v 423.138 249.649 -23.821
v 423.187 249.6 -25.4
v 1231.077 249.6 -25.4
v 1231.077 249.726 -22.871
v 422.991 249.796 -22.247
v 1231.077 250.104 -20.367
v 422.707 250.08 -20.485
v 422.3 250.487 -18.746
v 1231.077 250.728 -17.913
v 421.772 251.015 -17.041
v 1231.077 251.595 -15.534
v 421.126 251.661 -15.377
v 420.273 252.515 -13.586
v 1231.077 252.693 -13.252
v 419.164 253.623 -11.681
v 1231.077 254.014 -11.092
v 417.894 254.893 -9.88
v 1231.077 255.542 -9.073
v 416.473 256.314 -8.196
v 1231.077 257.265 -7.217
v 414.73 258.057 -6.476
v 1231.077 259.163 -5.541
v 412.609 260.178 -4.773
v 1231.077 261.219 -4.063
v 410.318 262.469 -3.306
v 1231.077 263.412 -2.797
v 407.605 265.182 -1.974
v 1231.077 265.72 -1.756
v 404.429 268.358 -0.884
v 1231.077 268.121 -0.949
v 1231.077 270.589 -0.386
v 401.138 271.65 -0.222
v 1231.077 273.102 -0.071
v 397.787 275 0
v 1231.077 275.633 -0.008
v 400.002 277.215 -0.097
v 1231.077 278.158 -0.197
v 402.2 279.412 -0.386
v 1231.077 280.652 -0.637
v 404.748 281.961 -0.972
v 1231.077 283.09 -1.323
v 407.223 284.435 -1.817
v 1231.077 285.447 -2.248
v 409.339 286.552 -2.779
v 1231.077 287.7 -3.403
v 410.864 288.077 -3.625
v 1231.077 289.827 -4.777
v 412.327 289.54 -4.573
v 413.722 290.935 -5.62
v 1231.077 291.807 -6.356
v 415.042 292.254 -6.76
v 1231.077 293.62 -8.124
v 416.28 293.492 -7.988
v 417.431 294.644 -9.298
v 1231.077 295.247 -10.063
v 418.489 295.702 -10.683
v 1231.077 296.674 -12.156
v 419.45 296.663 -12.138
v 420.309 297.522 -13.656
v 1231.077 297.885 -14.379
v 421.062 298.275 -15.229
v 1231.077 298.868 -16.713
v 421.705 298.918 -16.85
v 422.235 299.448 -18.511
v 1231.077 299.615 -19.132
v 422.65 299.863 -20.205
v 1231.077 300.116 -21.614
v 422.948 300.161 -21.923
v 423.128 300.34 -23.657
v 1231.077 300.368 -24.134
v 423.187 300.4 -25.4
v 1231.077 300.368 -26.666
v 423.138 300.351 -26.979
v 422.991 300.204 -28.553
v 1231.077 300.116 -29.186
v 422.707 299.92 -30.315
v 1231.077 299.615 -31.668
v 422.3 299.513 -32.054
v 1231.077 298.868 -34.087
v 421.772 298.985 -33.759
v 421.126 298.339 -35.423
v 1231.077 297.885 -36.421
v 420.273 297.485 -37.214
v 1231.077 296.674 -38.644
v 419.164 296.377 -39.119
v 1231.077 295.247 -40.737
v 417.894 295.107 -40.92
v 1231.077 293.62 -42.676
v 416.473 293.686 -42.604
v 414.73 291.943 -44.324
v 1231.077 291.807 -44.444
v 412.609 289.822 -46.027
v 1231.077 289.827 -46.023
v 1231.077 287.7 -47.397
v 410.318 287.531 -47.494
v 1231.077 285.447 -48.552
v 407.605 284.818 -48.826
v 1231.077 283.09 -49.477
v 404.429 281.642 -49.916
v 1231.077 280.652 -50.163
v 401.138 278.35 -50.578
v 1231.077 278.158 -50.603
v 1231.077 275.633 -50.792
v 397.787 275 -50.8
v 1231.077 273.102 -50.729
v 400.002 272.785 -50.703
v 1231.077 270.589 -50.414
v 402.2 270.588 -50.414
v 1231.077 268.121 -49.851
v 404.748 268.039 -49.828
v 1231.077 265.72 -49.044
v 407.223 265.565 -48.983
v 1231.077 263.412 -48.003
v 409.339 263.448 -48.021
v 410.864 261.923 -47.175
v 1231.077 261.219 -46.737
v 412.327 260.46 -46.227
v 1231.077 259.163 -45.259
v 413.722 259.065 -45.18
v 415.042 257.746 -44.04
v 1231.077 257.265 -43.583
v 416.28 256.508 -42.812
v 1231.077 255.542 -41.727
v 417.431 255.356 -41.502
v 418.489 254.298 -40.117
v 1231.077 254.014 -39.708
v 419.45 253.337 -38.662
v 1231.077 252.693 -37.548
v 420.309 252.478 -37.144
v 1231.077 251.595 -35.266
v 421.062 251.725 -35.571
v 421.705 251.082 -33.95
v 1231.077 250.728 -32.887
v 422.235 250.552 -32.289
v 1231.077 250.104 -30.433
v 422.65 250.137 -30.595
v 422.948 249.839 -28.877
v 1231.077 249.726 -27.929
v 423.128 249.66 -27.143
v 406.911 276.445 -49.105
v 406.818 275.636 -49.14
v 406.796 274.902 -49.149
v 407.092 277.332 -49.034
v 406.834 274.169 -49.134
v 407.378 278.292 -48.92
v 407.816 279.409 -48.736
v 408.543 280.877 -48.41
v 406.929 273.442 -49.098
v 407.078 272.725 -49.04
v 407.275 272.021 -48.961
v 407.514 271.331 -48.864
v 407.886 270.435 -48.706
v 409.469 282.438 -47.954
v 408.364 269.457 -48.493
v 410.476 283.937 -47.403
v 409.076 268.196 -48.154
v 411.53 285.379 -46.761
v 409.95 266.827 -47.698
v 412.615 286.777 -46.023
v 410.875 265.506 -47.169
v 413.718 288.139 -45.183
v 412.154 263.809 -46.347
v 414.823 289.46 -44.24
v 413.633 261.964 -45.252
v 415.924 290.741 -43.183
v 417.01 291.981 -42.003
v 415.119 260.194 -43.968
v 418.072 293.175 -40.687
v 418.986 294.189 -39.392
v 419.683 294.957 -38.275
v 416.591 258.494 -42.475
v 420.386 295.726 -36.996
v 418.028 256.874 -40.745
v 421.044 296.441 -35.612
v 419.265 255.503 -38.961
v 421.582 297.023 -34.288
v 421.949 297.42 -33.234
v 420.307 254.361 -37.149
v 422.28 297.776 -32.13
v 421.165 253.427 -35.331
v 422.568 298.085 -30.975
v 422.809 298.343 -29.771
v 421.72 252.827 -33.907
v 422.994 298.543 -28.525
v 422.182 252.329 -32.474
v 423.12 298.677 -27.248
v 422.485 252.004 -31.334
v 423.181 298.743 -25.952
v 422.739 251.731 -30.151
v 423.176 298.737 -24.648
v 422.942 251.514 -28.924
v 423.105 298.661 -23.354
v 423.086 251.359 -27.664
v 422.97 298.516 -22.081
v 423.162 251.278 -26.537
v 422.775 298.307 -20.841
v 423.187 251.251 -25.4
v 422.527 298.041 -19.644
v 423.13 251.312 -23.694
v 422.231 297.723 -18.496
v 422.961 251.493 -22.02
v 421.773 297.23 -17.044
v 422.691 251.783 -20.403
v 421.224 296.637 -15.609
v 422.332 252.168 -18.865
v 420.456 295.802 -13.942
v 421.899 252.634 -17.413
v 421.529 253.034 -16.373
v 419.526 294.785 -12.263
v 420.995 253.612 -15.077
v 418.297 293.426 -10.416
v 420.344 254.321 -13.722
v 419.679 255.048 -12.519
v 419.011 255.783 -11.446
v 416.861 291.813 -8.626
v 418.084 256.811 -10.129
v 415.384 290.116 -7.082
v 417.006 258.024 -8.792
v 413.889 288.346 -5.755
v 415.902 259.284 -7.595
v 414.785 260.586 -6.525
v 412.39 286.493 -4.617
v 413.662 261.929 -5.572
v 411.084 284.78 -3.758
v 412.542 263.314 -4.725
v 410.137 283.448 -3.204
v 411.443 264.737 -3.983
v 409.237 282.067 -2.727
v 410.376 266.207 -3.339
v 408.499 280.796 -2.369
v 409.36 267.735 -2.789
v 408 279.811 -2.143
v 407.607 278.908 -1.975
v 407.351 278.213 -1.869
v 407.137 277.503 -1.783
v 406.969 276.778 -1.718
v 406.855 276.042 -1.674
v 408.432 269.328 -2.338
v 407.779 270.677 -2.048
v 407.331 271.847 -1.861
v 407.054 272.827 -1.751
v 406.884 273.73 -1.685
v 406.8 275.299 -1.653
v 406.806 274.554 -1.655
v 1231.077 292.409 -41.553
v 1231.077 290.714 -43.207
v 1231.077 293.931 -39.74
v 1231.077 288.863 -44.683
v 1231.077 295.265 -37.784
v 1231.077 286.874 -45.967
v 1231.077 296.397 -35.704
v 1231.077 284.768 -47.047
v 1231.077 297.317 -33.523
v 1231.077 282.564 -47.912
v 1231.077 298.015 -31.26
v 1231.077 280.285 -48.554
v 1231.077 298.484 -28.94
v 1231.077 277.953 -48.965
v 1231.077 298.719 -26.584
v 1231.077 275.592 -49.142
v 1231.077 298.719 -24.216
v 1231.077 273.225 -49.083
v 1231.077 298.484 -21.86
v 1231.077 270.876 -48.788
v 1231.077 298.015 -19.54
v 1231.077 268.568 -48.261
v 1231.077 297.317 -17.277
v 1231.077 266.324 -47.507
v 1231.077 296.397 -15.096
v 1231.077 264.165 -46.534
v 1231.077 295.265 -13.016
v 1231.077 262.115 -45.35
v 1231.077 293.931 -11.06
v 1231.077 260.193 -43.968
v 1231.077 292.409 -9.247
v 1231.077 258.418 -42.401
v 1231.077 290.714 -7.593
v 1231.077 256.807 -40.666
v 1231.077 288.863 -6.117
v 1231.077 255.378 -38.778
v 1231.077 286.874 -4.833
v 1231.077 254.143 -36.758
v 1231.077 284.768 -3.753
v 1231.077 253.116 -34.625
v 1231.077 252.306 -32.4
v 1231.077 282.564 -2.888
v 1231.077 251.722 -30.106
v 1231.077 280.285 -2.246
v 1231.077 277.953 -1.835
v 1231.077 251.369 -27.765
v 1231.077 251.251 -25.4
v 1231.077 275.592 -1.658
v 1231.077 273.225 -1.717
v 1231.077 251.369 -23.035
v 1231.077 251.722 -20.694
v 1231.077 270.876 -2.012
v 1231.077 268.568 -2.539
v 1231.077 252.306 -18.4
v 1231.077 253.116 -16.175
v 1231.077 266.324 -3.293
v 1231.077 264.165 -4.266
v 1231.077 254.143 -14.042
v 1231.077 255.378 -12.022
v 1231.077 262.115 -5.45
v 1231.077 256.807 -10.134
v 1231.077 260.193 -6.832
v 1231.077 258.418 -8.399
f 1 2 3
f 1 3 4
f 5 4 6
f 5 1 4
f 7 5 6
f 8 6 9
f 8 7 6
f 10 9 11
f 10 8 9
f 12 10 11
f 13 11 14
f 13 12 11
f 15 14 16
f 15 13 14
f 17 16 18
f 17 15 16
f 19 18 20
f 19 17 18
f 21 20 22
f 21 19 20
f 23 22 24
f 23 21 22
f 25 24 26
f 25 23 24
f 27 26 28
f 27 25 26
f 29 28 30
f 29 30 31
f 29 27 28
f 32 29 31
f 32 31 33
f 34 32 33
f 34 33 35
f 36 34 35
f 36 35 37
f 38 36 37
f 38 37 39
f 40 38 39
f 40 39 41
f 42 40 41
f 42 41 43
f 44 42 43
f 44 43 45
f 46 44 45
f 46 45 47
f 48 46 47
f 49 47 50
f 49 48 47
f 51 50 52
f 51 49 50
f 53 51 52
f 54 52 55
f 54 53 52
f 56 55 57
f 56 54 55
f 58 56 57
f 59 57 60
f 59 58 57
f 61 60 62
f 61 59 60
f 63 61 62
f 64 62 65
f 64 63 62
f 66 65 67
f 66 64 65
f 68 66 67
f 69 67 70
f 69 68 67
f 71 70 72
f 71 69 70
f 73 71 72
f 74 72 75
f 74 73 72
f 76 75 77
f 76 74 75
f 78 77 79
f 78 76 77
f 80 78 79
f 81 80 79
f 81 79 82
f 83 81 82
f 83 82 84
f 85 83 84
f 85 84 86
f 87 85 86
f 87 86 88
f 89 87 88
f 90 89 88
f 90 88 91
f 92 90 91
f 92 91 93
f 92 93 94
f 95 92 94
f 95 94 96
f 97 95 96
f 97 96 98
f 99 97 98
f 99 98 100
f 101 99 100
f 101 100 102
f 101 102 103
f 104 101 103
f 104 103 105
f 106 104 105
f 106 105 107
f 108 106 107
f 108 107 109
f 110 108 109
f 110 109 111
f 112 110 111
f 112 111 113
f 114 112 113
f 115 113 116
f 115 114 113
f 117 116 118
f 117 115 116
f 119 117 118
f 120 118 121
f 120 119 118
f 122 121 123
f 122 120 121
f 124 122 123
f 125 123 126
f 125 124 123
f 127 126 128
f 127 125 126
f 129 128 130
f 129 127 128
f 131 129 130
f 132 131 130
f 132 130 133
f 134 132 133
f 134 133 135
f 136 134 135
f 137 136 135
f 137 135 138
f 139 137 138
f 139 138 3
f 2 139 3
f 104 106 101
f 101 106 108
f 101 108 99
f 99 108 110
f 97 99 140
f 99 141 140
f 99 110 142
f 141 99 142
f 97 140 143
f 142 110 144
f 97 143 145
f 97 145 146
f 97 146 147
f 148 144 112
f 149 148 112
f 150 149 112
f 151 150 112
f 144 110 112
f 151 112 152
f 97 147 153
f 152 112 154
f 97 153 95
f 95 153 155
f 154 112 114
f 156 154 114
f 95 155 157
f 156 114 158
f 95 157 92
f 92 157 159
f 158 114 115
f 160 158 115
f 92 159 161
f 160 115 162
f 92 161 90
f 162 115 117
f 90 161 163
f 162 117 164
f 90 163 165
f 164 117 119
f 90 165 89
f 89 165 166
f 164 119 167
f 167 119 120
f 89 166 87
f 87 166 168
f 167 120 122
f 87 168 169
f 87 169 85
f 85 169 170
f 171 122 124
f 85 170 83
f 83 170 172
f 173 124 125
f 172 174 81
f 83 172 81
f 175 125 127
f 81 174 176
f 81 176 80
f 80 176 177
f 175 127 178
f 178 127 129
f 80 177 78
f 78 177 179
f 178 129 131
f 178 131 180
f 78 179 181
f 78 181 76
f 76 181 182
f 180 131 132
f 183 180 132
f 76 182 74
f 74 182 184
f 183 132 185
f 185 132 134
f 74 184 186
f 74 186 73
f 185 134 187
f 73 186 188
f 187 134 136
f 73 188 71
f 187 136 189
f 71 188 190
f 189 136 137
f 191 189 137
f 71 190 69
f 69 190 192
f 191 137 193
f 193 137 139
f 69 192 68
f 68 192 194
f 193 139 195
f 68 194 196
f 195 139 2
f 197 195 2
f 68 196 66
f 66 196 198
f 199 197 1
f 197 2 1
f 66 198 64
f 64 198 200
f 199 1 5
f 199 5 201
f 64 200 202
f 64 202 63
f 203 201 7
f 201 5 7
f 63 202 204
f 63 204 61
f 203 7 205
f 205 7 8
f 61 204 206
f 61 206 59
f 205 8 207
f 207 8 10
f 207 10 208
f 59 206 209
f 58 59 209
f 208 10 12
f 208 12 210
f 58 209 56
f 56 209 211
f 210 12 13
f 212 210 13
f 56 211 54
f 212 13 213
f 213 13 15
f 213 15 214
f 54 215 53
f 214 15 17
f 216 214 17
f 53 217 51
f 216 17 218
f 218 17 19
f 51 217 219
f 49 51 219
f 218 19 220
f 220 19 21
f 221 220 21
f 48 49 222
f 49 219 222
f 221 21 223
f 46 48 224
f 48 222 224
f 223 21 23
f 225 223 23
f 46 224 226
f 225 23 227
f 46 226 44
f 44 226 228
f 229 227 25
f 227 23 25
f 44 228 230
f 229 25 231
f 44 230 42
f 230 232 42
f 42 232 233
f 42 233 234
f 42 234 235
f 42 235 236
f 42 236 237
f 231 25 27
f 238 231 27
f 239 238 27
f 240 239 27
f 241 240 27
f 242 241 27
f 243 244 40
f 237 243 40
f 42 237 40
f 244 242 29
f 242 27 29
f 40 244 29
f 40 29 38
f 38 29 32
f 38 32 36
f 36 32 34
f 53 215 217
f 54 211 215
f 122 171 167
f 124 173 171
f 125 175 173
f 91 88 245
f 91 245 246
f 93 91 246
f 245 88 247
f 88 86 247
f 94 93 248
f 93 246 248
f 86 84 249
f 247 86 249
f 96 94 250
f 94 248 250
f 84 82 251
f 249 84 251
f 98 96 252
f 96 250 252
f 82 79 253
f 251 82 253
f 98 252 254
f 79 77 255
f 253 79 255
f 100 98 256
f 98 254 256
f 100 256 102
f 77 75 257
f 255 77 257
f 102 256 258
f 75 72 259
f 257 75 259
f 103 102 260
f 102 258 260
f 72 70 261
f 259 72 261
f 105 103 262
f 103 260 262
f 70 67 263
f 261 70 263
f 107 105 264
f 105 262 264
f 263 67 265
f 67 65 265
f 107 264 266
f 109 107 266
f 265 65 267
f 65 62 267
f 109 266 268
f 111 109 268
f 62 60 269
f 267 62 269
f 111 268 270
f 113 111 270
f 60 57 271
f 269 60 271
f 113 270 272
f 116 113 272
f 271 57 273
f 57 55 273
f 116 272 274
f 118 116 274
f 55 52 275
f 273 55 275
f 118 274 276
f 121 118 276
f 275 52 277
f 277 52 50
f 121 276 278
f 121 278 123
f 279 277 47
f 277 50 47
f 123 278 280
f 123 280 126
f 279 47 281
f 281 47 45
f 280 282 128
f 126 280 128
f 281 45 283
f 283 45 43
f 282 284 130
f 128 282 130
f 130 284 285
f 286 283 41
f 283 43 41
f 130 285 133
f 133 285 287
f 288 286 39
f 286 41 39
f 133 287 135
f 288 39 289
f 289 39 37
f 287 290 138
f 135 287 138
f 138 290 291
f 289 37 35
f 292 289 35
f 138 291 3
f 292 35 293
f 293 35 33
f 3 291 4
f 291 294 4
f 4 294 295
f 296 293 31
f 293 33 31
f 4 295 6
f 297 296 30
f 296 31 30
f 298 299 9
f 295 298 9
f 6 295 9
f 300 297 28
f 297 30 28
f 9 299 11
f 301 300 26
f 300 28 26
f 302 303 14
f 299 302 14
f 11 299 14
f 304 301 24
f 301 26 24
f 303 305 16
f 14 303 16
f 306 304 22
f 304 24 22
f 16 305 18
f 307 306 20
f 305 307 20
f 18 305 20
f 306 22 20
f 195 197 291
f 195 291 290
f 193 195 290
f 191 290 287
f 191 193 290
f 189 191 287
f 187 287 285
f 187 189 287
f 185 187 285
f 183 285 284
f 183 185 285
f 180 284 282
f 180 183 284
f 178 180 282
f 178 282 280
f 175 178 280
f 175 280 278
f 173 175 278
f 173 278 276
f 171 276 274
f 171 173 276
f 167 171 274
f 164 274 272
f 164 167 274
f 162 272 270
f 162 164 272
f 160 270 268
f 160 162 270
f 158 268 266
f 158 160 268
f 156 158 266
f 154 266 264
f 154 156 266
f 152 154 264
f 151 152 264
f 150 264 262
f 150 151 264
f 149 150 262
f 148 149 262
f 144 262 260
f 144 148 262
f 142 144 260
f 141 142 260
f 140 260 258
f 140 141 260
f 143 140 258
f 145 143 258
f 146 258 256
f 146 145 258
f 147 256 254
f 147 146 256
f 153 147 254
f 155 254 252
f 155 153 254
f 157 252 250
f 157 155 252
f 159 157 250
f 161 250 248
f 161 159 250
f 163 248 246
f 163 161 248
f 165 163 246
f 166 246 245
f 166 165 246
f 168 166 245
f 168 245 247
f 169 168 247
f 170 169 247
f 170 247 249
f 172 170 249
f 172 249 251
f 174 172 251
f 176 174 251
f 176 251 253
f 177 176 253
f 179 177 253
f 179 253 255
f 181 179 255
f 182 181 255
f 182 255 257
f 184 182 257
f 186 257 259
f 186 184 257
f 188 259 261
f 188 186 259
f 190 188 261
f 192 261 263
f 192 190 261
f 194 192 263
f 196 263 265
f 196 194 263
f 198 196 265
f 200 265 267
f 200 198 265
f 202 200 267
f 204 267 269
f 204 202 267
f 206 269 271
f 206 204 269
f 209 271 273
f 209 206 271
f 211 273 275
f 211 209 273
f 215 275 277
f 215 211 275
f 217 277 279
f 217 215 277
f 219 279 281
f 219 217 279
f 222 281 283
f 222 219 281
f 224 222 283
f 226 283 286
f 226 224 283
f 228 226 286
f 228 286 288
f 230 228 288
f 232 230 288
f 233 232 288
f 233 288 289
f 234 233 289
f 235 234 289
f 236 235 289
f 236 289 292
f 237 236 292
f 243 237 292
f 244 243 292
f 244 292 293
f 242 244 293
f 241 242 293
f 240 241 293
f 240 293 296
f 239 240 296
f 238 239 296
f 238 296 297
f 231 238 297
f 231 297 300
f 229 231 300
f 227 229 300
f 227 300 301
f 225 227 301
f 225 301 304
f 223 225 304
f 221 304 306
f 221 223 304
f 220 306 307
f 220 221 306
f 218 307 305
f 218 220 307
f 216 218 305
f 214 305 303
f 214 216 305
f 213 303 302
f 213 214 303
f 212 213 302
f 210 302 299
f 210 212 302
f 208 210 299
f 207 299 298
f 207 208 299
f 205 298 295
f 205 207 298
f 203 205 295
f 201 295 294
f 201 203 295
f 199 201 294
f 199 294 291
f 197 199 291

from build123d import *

# Parameters (mm, degrees)
SKETCH004_R          = 25.4
PAD002_DEPTH         = 833.289565
SKETCH013_R          = 23.749
POCKET004_DEPTH      = 833.290565
SKETCH012_R          = 25.4
POCKET005_DEPTH      = 0.001
POCKET005_DEPTH_BACK = 300.401


with BuildPart() as cargo_side_tube_r:
    # Sketch004 → Pad002 (new body)
    with BuildSketch(Plane.YZ):
        with Locations((-275, -25.4)):
            Circle(SKETCH004_R)
    extrude(amount=PAD002_DEPTH)

    # Sketch013 (on Face2 of Pad002) → Pocket004 (cut, through all)
    with BuildSketch(Plane(origin=(0, 0, 0), x_dir=(0, 1, 0), z_dir=(-1, 0, 0))):
        with Locations((-275, 25.4)):
            Circle(SKETCH013_R)
    extrude(amount=-POCKET004_DEPTH, mode=Mode.SUBTRACT)

    # Sketch012 → Pocket005 (cut, two sides)
    with BuildSketch(Plane.XZ) as pocket005_sk:
        with Locations((0, -25.4)):
            Circle(SKETCH012_R)
    extrude(amount=-POCKET005_DEPTH, mode=Mode.SUBTRACT)
    extrude(pocket005_sk.sketch, amount=POCKET005_DEPTH_BACK, mode=Mode.SUBTRACT)


with BuildPart() as cargo_side_tube_r_1:
    # Body002 placement: moved
    add(cargo_side_tube_r.part.moved(Location((397.787357, 0, 0))))


with BuildPart() as cargo_side_tube_l:
    # Part__Mirroring: instance of cargo_side_tube_r
    add(cargo_side_tube_r_1.part.mirror(Plane(origin=(0, 0, 0), x_dir=(1, 0, 0), z_dir=(0, 1, 0))))


solid = cargo_side_tube_l.part
